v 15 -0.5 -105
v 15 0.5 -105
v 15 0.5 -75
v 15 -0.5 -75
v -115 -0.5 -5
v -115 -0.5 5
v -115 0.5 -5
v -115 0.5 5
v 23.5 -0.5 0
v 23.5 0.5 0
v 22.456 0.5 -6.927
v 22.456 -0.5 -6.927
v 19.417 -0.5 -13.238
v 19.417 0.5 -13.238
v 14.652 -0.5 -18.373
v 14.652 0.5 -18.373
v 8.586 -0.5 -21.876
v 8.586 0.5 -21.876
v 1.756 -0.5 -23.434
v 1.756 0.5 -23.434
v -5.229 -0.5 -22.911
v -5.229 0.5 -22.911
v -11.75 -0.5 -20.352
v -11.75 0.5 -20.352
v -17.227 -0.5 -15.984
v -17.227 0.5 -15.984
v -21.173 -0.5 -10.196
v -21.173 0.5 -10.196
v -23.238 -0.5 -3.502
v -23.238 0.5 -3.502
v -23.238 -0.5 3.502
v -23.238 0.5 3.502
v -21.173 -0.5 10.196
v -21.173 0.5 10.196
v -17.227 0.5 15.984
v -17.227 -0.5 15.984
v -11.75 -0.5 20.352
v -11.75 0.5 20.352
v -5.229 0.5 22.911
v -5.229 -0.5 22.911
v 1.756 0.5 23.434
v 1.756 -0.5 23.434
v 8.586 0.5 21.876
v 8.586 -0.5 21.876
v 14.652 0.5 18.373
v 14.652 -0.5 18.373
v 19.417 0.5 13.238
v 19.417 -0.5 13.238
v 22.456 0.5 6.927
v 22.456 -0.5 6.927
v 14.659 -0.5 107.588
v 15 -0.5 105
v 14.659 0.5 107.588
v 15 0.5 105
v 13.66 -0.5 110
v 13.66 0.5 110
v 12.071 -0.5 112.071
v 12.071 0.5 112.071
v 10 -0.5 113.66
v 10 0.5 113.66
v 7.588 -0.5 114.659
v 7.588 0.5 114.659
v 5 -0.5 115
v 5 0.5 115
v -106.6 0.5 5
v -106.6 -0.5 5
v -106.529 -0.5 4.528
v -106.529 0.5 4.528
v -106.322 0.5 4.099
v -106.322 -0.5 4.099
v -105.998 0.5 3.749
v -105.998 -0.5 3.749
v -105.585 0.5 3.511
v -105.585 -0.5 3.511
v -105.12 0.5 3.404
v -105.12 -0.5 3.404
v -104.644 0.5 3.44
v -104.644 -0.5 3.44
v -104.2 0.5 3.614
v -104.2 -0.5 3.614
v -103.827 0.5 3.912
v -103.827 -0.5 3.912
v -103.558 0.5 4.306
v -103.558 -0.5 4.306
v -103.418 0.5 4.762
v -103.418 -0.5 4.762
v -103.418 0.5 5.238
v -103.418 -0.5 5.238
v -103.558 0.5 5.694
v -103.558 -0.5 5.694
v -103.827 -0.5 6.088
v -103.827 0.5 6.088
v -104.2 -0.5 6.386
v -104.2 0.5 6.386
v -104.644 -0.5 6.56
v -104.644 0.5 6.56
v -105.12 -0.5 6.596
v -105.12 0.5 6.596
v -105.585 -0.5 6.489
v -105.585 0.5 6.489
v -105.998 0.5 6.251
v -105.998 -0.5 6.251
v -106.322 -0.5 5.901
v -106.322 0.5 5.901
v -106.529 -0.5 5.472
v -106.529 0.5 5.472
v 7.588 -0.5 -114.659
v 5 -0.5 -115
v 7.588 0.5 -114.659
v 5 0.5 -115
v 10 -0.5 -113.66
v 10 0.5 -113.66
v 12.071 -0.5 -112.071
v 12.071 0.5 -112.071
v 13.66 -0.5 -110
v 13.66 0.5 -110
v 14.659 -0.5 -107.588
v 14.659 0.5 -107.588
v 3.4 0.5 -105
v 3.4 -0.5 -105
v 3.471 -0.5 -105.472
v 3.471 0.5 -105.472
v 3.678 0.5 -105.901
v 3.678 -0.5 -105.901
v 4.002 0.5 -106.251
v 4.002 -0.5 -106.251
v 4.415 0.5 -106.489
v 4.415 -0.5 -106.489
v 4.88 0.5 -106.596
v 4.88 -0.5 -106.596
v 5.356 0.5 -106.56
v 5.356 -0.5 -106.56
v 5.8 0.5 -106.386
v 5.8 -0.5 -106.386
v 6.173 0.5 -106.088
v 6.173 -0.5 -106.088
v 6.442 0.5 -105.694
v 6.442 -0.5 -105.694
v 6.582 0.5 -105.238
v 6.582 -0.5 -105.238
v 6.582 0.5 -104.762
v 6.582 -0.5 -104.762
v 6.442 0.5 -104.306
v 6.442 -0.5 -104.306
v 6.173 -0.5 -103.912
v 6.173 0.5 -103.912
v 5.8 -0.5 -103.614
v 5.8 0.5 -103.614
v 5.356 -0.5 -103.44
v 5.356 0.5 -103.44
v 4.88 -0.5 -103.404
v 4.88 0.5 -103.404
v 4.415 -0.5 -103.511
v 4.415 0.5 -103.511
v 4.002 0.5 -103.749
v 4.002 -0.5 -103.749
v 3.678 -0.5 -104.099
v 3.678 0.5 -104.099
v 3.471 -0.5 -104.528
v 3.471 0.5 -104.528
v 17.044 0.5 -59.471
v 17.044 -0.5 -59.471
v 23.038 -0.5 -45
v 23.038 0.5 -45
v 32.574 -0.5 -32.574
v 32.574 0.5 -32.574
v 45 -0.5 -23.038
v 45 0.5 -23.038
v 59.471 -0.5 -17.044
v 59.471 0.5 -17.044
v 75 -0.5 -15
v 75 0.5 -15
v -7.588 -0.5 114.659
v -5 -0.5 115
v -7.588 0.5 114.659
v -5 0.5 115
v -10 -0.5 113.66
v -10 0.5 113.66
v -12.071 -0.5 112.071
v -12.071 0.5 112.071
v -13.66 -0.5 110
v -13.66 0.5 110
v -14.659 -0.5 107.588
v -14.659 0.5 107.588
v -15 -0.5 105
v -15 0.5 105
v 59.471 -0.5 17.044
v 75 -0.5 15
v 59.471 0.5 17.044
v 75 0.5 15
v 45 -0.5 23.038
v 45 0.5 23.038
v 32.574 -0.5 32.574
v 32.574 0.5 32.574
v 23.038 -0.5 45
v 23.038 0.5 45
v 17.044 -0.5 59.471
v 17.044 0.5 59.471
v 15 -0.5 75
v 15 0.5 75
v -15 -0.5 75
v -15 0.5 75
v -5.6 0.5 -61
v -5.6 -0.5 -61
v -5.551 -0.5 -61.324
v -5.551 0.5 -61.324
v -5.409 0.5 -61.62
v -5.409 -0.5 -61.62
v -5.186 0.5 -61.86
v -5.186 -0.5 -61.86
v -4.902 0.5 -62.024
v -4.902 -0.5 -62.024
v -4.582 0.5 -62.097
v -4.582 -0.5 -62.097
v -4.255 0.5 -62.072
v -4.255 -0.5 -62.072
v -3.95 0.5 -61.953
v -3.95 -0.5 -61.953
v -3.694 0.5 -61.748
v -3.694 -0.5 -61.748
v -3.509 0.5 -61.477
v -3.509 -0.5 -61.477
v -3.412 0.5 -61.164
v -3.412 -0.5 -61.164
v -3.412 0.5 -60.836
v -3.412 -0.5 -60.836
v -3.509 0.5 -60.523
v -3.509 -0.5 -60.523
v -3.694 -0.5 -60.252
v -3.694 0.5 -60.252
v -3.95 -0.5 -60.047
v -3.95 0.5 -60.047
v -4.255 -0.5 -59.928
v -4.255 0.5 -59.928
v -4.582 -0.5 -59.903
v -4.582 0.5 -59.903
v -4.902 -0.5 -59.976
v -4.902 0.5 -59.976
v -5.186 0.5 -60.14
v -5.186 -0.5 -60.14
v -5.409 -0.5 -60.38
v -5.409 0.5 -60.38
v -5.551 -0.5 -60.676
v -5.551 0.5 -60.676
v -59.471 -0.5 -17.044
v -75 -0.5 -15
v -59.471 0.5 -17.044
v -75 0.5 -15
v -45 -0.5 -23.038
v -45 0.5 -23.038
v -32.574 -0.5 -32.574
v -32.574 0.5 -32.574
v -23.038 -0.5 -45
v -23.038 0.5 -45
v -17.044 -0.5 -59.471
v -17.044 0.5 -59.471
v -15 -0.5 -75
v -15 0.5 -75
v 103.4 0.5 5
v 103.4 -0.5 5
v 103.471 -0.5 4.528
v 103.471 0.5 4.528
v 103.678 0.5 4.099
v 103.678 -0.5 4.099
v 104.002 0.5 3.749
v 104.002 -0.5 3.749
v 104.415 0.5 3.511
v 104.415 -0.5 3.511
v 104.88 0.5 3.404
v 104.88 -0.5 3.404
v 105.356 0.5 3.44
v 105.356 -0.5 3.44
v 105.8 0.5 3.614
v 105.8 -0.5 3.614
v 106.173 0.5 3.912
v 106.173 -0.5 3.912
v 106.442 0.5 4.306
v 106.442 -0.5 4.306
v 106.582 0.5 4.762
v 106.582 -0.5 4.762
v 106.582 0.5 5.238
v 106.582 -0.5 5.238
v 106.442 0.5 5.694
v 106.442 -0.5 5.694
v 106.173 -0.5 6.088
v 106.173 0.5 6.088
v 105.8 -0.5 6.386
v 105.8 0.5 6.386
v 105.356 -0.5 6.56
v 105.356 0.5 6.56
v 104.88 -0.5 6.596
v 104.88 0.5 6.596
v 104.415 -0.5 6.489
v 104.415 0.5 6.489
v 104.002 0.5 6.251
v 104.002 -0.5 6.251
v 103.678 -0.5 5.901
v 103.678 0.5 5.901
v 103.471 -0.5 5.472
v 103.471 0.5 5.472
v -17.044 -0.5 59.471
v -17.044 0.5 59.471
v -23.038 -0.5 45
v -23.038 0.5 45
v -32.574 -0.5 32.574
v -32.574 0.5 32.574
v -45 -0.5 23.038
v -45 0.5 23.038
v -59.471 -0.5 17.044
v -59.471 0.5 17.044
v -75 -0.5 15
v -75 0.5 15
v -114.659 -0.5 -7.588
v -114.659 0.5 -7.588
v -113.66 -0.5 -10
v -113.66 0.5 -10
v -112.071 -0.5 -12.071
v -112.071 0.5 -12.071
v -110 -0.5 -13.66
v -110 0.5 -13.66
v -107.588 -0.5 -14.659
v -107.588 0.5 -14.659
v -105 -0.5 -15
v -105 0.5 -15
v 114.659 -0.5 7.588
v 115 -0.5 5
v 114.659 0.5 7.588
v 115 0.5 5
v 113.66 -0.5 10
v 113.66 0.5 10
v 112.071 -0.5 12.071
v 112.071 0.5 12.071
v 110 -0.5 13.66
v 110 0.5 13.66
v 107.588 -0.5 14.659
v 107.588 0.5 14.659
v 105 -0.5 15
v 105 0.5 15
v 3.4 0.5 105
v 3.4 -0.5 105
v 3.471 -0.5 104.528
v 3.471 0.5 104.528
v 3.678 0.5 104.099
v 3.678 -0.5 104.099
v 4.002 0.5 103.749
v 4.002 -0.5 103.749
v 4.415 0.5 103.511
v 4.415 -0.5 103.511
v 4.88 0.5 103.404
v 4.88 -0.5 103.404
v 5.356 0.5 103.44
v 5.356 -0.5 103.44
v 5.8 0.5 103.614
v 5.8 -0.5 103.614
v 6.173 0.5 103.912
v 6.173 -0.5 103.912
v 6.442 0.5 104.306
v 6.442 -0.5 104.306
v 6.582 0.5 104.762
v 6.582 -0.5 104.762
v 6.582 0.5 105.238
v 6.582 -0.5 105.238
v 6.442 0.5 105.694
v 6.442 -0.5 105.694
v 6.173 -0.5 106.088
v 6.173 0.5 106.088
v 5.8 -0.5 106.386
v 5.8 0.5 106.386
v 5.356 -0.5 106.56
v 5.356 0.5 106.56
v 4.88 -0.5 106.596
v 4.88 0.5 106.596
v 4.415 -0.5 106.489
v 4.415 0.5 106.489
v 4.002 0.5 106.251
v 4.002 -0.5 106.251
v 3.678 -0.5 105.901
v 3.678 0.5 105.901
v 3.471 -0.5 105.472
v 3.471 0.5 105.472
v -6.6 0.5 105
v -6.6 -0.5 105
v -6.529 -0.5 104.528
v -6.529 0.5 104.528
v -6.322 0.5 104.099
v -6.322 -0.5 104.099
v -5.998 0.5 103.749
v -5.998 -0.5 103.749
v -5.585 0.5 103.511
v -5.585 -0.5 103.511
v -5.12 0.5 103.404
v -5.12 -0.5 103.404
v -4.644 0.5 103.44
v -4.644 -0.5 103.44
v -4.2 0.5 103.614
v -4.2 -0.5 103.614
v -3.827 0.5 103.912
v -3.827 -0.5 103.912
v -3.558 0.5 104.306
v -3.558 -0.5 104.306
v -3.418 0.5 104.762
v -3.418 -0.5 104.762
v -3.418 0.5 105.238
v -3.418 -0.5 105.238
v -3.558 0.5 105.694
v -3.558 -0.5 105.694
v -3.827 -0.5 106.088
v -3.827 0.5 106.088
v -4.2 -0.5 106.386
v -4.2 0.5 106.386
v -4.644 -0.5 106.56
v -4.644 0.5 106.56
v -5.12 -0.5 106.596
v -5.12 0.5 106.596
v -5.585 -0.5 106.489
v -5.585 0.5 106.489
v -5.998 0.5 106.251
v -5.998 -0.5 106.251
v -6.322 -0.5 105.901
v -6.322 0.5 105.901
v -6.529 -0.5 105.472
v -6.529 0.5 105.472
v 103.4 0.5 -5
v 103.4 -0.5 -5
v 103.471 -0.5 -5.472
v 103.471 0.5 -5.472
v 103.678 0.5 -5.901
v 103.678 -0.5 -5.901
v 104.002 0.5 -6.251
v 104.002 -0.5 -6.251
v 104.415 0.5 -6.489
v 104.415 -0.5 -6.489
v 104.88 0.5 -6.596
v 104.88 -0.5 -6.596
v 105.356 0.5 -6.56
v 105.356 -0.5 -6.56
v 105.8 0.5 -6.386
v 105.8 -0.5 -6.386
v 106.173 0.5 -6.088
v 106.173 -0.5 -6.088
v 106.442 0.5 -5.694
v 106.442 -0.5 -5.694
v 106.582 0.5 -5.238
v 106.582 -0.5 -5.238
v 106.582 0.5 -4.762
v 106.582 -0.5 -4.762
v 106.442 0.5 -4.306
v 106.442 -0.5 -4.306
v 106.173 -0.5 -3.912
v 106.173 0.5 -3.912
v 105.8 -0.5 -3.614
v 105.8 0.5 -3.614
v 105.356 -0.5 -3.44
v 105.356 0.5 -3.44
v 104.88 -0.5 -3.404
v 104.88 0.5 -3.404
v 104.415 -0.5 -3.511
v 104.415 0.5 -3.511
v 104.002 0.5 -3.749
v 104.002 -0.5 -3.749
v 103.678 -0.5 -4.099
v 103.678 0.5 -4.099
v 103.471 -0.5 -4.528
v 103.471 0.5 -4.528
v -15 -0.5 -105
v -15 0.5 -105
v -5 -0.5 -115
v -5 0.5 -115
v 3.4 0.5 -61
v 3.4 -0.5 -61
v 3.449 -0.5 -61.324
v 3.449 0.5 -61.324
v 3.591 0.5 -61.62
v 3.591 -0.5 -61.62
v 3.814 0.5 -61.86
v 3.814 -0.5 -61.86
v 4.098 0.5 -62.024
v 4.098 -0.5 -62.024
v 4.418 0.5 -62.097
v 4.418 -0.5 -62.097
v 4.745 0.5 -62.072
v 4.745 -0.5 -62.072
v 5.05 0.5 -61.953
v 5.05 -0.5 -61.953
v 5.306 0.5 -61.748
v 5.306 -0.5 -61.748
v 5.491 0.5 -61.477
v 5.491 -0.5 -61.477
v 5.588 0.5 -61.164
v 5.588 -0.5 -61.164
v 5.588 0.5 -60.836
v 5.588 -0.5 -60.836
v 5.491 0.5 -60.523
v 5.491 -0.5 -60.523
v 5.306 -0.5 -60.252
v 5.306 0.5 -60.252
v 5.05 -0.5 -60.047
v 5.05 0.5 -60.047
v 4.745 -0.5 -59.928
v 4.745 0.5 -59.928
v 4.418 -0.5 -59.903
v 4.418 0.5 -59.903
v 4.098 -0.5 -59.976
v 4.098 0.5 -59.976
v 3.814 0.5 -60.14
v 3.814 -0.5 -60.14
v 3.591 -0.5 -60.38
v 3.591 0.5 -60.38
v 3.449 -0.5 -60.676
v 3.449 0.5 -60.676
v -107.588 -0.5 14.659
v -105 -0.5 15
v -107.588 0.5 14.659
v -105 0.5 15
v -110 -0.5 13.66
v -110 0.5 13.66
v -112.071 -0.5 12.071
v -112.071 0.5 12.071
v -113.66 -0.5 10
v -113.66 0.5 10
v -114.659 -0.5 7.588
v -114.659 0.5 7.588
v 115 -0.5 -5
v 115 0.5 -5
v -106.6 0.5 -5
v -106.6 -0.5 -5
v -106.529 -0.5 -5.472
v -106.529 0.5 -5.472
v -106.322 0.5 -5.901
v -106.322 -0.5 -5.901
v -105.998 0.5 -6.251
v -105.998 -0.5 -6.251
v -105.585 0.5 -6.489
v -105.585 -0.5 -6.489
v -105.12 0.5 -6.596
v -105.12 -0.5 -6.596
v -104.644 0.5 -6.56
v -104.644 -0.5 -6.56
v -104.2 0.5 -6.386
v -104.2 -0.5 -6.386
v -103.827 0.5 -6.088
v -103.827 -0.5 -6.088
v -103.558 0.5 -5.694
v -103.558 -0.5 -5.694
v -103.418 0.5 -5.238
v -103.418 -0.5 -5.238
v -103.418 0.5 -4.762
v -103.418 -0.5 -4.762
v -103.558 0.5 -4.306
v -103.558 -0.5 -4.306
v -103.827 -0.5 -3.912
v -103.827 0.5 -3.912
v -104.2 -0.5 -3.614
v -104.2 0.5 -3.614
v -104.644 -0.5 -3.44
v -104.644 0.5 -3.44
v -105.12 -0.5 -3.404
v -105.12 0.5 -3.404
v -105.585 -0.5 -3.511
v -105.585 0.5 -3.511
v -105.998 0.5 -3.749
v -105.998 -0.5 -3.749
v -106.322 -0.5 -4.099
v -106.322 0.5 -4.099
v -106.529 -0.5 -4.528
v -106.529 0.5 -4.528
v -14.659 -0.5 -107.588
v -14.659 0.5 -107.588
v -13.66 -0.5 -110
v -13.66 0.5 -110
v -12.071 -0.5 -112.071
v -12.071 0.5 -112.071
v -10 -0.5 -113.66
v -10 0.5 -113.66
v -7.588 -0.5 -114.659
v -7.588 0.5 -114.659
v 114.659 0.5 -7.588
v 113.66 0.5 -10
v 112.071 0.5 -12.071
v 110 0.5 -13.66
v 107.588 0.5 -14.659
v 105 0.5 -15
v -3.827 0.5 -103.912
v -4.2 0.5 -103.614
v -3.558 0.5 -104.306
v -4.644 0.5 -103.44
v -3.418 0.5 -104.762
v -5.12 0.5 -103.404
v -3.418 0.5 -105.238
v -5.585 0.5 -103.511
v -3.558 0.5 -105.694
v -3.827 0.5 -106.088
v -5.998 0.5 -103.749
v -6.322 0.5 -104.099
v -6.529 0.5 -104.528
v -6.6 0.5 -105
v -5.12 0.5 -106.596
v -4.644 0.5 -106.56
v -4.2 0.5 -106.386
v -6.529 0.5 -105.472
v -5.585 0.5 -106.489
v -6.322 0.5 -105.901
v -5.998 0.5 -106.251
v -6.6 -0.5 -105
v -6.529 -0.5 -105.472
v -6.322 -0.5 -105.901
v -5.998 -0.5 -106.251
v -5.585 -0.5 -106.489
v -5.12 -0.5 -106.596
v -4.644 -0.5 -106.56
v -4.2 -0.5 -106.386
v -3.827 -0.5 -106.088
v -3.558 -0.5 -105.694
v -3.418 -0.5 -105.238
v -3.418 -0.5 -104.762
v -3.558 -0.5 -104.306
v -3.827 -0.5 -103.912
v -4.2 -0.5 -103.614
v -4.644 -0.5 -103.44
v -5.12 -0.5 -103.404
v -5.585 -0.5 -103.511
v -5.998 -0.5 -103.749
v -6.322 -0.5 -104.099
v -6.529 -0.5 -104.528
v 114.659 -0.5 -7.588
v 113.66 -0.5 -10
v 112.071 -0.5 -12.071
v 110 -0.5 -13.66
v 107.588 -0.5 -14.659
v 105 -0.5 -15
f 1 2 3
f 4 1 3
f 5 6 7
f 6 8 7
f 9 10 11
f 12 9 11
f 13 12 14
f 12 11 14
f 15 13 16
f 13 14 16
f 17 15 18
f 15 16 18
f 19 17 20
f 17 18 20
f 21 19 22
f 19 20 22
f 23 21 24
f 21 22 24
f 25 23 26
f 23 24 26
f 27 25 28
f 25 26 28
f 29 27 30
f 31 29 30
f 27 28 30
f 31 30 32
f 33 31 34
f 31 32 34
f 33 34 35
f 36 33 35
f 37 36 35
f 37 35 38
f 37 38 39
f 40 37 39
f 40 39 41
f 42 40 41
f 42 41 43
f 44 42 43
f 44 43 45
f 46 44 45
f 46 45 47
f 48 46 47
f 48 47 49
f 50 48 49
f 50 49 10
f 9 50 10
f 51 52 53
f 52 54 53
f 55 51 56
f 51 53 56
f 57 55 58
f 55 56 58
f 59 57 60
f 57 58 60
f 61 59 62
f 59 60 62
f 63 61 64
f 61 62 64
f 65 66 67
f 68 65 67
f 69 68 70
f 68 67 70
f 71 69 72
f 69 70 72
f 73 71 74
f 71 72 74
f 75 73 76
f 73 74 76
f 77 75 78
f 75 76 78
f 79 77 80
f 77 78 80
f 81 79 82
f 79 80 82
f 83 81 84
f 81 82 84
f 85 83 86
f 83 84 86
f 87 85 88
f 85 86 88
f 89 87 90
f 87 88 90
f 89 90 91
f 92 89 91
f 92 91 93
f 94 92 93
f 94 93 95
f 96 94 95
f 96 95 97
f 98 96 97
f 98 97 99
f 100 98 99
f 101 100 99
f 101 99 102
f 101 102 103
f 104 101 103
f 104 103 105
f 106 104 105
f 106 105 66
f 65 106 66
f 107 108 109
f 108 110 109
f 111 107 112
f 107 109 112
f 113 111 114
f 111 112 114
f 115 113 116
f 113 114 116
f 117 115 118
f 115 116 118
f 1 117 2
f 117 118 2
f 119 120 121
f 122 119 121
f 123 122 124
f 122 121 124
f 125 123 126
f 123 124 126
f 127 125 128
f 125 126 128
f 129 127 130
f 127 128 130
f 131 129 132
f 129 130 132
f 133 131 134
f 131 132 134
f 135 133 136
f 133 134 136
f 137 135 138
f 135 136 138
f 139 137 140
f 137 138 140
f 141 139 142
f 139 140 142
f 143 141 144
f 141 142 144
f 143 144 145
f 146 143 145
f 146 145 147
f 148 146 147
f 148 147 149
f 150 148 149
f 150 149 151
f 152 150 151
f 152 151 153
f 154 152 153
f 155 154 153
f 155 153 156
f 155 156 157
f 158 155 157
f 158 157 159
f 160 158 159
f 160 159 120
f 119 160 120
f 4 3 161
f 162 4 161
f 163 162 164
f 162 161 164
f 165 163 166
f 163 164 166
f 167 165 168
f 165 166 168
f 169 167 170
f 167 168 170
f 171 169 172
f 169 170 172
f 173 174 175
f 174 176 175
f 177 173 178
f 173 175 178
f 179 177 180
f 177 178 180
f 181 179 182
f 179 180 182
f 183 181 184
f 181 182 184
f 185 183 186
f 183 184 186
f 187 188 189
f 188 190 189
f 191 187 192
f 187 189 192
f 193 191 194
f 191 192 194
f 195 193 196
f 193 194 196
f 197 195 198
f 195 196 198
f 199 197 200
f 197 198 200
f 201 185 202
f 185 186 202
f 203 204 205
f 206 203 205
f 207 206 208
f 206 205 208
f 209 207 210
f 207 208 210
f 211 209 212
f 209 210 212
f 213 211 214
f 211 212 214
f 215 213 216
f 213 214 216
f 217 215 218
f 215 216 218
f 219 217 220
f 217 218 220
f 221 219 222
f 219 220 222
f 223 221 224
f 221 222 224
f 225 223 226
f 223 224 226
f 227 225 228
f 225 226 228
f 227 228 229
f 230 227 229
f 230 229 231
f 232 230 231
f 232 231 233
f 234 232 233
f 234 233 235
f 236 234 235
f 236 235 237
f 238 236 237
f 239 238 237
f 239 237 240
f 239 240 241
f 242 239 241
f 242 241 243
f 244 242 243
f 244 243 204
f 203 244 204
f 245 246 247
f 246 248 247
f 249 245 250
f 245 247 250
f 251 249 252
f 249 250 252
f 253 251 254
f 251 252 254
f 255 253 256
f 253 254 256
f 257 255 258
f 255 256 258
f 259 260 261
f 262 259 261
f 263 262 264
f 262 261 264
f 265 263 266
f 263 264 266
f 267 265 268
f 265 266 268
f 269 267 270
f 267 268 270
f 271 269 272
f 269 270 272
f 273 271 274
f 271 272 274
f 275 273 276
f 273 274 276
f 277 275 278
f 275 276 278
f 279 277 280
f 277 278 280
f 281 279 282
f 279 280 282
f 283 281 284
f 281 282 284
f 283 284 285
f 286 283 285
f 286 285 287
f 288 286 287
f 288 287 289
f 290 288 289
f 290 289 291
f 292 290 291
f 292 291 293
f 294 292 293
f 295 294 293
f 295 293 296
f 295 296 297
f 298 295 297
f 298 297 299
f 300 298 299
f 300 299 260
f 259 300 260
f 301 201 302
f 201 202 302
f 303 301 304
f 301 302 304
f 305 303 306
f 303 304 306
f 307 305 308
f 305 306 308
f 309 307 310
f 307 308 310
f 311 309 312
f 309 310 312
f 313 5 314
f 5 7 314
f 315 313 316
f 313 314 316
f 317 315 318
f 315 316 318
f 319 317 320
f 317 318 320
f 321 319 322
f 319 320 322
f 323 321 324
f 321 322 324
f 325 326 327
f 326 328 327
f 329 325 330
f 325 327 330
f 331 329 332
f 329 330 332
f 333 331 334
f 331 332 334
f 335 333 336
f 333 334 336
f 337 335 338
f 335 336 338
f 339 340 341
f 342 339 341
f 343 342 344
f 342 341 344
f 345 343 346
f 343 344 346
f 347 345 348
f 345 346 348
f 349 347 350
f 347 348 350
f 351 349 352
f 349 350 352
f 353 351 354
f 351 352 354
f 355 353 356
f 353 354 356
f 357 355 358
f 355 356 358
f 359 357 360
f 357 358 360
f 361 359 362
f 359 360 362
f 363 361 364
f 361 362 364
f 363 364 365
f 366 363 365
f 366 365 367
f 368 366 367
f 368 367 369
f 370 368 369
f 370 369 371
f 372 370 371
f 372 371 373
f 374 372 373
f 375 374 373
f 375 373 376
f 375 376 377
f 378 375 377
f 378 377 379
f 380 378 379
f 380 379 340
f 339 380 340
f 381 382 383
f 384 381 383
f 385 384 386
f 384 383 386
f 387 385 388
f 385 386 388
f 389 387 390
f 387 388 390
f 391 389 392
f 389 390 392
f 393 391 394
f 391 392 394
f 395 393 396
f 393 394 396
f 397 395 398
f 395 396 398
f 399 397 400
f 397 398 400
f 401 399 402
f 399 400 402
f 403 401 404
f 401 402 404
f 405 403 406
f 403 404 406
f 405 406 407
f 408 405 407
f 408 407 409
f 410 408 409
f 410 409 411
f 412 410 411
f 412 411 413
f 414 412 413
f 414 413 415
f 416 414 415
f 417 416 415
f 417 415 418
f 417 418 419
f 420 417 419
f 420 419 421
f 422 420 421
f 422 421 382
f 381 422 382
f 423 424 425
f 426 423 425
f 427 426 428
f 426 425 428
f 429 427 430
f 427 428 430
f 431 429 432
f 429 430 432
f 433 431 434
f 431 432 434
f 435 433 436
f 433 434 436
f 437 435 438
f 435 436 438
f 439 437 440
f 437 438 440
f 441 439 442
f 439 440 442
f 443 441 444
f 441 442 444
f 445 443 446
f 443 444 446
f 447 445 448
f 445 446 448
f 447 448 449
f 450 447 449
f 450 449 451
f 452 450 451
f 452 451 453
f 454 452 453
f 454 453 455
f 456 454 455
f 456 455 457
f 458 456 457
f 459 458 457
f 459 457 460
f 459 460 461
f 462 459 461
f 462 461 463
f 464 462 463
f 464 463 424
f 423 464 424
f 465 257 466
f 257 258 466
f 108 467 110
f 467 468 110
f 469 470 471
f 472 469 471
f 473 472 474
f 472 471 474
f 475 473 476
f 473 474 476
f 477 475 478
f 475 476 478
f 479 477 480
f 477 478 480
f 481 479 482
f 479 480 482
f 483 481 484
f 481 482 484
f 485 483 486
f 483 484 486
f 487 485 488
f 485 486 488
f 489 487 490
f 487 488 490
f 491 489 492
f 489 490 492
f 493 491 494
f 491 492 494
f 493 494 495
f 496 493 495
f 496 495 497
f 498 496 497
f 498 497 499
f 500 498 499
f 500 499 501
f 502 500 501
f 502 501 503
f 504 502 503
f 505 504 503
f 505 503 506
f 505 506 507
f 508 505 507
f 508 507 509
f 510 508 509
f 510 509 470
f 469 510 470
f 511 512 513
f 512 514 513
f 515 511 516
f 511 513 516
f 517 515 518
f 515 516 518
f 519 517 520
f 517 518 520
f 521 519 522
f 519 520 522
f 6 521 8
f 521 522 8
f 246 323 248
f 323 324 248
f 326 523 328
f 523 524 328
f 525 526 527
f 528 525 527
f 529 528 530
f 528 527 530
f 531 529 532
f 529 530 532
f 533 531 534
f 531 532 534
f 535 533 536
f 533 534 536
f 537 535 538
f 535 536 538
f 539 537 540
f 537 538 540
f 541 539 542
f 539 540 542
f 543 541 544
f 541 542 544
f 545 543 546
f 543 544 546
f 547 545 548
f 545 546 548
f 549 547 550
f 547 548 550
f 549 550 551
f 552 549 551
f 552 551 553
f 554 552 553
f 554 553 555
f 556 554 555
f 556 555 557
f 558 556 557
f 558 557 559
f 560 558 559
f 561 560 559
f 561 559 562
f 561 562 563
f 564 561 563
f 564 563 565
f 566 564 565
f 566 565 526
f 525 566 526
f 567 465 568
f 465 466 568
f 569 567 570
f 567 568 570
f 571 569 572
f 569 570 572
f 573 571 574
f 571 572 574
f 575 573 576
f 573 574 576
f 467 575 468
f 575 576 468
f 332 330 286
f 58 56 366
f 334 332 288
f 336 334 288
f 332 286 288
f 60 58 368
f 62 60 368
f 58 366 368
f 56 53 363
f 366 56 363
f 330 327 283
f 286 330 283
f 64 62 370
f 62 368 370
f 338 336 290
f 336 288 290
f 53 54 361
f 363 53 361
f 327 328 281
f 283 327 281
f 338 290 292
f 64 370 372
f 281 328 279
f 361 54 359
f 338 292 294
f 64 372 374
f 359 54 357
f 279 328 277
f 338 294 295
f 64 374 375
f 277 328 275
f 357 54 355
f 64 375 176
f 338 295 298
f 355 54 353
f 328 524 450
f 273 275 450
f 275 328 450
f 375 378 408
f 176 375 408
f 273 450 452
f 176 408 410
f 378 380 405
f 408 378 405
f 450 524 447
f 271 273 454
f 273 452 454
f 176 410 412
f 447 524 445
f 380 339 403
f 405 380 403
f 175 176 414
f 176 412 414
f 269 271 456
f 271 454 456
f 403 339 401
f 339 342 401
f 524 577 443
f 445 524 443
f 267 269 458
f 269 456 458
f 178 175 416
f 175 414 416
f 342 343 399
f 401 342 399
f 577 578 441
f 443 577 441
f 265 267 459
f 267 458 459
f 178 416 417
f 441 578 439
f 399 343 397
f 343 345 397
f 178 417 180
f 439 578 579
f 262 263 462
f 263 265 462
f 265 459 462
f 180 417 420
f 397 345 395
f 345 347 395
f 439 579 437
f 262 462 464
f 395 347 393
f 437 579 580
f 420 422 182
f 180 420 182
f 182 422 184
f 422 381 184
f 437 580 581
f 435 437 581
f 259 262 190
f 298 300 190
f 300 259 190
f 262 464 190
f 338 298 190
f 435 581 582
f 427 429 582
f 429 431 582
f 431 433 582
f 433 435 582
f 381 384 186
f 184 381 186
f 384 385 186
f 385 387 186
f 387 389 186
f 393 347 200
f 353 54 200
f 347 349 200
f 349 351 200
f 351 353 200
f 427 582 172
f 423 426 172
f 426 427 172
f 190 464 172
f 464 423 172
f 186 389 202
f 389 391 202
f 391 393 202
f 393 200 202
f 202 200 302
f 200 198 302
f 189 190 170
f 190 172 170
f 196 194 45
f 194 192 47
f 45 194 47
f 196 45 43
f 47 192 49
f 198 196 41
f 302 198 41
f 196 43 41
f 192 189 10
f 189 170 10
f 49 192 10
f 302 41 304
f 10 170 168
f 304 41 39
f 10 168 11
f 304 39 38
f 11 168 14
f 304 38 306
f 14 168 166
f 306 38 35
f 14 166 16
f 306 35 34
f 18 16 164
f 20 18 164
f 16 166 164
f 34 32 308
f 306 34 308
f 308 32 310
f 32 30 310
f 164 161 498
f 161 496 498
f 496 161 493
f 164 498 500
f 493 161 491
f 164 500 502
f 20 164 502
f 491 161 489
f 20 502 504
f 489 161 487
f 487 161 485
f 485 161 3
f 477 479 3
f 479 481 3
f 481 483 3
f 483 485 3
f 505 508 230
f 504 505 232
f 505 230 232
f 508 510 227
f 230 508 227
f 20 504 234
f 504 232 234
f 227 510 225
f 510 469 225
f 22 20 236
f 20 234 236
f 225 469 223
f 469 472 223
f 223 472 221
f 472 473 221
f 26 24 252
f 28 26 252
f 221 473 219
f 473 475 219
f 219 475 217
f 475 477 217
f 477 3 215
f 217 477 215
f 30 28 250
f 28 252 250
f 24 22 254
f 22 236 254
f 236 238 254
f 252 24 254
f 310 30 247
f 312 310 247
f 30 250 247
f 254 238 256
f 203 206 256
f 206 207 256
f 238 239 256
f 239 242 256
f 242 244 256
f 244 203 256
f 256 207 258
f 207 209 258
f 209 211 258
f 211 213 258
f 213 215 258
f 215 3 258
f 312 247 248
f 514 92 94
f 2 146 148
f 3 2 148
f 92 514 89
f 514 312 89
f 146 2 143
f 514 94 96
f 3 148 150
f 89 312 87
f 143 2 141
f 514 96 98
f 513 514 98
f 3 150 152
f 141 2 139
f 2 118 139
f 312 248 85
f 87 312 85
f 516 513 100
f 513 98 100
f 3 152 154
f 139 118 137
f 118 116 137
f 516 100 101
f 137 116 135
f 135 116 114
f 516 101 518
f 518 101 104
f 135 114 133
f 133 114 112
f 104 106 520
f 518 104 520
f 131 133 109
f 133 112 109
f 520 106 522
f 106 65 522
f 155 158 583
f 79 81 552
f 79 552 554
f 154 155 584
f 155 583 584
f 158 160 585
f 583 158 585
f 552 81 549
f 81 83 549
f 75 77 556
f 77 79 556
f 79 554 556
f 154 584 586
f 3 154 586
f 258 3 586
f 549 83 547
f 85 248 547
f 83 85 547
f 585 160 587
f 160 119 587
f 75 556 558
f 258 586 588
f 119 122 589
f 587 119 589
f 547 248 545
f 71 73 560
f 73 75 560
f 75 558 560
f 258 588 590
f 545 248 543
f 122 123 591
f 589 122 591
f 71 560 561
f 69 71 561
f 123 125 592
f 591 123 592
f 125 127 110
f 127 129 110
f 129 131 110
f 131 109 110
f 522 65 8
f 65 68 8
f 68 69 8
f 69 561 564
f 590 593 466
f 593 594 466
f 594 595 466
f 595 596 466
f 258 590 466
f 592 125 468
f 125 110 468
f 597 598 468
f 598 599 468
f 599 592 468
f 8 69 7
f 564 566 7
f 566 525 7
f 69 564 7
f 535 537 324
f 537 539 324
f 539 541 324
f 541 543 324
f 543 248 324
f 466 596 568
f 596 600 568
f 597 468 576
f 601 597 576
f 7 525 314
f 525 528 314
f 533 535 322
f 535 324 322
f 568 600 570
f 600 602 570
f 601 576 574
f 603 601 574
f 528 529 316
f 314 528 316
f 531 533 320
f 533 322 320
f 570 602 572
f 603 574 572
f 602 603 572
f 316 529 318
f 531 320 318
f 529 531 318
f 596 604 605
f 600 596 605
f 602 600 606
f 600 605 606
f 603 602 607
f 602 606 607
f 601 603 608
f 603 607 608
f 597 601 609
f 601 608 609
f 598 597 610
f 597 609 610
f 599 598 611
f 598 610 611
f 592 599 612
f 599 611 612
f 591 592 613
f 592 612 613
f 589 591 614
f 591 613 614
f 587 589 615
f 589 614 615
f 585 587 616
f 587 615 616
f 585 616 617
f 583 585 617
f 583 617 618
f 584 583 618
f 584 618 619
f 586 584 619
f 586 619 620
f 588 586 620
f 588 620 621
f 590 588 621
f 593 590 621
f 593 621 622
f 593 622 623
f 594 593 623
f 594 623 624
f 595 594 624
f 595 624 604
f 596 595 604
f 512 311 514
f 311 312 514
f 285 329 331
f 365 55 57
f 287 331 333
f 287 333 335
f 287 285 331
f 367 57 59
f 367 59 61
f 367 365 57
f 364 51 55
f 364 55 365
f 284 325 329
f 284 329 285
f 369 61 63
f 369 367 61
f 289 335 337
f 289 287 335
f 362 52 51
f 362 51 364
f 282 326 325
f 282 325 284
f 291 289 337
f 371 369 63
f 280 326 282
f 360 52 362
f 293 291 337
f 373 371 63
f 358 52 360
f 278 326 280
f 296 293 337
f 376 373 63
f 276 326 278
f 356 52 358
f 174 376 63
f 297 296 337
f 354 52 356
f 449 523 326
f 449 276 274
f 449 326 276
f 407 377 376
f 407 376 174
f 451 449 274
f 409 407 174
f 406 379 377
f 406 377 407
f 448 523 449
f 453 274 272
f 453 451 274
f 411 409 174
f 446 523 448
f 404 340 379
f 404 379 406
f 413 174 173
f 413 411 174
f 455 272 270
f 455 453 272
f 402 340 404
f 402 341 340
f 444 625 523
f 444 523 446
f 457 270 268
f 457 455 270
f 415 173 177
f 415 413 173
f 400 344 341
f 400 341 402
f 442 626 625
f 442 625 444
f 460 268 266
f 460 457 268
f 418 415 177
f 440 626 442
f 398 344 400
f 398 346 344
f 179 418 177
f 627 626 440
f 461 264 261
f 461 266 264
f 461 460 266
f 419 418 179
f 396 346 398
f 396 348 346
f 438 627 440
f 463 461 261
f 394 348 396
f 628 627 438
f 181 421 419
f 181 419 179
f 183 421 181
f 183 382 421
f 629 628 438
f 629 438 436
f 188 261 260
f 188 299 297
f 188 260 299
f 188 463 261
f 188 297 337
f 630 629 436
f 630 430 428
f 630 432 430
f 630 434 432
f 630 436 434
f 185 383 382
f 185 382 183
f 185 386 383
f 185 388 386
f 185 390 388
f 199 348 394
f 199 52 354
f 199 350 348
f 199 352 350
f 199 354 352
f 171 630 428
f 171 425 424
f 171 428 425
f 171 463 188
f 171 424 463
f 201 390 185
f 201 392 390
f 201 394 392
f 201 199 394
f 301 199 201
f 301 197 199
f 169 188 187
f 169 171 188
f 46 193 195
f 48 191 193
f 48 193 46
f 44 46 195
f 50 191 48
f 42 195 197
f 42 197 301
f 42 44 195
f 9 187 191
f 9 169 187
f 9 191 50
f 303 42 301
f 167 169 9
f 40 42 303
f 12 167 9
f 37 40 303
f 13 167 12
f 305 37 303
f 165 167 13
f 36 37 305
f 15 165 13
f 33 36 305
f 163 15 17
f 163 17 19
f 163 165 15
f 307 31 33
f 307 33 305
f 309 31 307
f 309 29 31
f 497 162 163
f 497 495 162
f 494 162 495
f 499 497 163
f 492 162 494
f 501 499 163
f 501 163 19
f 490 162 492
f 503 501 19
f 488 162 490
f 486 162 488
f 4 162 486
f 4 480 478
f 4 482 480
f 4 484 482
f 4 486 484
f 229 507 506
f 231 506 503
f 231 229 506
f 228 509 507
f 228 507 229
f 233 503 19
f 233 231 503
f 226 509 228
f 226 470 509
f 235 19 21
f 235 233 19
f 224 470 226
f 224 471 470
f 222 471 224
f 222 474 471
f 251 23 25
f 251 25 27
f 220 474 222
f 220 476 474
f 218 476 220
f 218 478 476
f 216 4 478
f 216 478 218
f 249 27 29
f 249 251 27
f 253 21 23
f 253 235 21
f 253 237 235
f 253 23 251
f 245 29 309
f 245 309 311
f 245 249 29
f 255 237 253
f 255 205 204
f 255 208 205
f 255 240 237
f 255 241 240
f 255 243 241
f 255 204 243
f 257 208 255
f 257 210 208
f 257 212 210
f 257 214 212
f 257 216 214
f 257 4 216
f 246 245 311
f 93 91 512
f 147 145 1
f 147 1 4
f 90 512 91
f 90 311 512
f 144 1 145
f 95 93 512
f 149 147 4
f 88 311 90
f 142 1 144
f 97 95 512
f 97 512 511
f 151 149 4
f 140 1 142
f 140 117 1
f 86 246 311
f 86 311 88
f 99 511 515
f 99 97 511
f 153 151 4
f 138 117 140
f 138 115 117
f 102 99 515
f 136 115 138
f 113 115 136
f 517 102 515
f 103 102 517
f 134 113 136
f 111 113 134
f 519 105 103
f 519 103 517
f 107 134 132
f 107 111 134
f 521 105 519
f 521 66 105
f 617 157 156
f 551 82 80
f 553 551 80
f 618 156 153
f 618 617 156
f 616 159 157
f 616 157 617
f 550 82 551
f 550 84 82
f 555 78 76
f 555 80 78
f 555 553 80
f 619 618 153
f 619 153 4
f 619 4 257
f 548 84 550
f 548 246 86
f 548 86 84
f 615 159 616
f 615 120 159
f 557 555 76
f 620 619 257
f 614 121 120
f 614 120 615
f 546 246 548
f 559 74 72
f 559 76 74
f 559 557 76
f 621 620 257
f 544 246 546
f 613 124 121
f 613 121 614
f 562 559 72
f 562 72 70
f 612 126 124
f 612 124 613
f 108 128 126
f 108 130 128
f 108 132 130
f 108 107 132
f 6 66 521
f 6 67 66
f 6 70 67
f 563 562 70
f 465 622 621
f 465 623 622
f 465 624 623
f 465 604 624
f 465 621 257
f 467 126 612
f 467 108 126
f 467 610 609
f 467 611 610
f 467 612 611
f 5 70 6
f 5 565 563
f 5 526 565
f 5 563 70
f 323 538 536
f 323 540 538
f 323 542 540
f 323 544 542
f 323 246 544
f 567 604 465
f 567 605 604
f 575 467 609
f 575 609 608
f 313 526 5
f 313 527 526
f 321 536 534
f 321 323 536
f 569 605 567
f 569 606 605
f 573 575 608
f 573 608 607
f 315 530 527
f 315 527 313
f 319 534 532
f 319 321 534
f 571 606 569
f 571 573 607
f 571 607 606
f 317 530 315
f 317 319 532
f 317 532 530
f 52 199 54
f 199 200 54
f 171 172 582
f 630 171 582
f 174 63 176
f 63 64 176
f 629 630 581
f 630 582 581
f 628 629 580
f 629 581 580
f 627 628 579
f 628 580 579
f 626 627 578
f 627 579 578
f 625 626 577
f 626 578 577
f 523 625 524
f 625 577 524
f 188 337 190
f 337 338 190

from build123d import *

# Parameters (mm, degrees)
BOSS_EXTRUDE1_DEPTH      = 0.5
M3_CLEARANCE_HOLE1_D     = 3.2
M3_CLEARANCE_HOLE1_DEPTH = 1
SKETCH5_R                = 23.5
CUT_EXTRUDE1_DEPTH       = 1
CUT_EXTRUDE1_DEPTH_BACK  = 2
M2_CLEARANCE_HOLE1_D     = 2.2
M2_CLEARANCE_HOLE1_DEPTH = 1


with BuildPart() as part:
    # Sketch1 → Boss-Extrude1 (new body, symmetric)
    with BuildSketch(Plane(origin=(0, 0, 0), x_dir=(1, 0, 0), z_dir=(0, 1, 0))):
        with BuildLine():
            Line((75, 15), (105, 15))
            ThreePointArc((105, 15), (112.071067812, 12.071067812), (115, 5))
            Line((115, 5), (115, -5))
            ThreePointArc((115, -5), (112.071067812, -12.071067812), (105, -15))
            Line((105, -15), (75, -15))
            ThreePointArc((75, -15), (32.573593129, -32.573593129), (15, -75))
            Line((15, -75), (15, -105))
            ThreePointArc((15, -105), (12.071067812, -112.071067812), (5, -115))
            Line((5, -115), (-5, -115))
            ThreePointArc((-5, -115), (-12.071067812, -112.071067812), (-15, -105))
            Line((-15, -105), (-15, -75))
            ThreePointArc((-15, -75), (-32.573593129, -32.573593129), (-75, -15))
            Line((-75, -15), (-105, -15))
            ThreePointArc((-105, -15), (-112.071067812, -12.071067812), (-115, -5))
            Line((-115, -5), (-115, 5))
            ThreePointArc((-115, 5), (-112.071067812, 12.071067812), (-105, 15))
            Line((-105, 15), (-75, 15))
            ThreePointArc((-75, 15), (-32.573593129, 32.573593129), (-15, 75))
            Line((-15, 75), (-15, 105))
            ThreePointArc((-15, 105), (-12.071067812, 112.071067812), (-5, 115))
            Line((-5, 115), (5, 115))
            ThreePointArc((5, 115), (12.071067812, 112.071067812), (15, 105))
            Line((15, 105), (15, 75))
            ThreePointArc((15, 75), (32.573593129, 32.573593129), (75, 15))
        make_face()
    extrude(amount=BOSS_EXTRUDE1_DEPTH, both=True)

    # M3 Clearance Hole1
    with Locations(Plane(origin=(0, 0.5, 0), x_dir=(1, 0, 0), z_dir=(0, 1, 0))):
        with Locations((-105, 5), (-105, -5), (-5, 105), (5, 105), (105, 5), (105, -5), (5, -105), (-5, -105)):
            Hole(M3_CLEARANCE_HOLE1_D / 2, depth=M3_CLEARANCE_HOLE1_DEPTH)

    # Sketch5 → Cut-Extrude1 (cut, two sides)
    with BuildSketch(Plane(origin=(0, 0.5, 0), x_dir=(1, 0, 0), z_dir=(0, 1, 0))) as cut_extrude1_sk:
        Circle(SKETCH5_R)
    extrude(amount=CUT_EXTRUDE1_DEPTH, mode=Mode.SUBTRACT)
    extrude(cut_extrude1_sk.sketch, amount=-CUT_EXTRUDE1_DEPTH_BACK, mode=Mode.SUBTRACT)

    # M2 Clearance Hole1
    with Locations(Plane(origin=(0, 0.5, 0), x_dir=(1, 0, 0), z_dir=(0, 1, 0))):
        with Locations((-4.5, 61), (4.5, 61)):
            Hole(M2_CLEARANCE_HOLE1_D / 2, depth=M2_CLEARANCE_HOLE1_DEPTH)


solid = part.part
